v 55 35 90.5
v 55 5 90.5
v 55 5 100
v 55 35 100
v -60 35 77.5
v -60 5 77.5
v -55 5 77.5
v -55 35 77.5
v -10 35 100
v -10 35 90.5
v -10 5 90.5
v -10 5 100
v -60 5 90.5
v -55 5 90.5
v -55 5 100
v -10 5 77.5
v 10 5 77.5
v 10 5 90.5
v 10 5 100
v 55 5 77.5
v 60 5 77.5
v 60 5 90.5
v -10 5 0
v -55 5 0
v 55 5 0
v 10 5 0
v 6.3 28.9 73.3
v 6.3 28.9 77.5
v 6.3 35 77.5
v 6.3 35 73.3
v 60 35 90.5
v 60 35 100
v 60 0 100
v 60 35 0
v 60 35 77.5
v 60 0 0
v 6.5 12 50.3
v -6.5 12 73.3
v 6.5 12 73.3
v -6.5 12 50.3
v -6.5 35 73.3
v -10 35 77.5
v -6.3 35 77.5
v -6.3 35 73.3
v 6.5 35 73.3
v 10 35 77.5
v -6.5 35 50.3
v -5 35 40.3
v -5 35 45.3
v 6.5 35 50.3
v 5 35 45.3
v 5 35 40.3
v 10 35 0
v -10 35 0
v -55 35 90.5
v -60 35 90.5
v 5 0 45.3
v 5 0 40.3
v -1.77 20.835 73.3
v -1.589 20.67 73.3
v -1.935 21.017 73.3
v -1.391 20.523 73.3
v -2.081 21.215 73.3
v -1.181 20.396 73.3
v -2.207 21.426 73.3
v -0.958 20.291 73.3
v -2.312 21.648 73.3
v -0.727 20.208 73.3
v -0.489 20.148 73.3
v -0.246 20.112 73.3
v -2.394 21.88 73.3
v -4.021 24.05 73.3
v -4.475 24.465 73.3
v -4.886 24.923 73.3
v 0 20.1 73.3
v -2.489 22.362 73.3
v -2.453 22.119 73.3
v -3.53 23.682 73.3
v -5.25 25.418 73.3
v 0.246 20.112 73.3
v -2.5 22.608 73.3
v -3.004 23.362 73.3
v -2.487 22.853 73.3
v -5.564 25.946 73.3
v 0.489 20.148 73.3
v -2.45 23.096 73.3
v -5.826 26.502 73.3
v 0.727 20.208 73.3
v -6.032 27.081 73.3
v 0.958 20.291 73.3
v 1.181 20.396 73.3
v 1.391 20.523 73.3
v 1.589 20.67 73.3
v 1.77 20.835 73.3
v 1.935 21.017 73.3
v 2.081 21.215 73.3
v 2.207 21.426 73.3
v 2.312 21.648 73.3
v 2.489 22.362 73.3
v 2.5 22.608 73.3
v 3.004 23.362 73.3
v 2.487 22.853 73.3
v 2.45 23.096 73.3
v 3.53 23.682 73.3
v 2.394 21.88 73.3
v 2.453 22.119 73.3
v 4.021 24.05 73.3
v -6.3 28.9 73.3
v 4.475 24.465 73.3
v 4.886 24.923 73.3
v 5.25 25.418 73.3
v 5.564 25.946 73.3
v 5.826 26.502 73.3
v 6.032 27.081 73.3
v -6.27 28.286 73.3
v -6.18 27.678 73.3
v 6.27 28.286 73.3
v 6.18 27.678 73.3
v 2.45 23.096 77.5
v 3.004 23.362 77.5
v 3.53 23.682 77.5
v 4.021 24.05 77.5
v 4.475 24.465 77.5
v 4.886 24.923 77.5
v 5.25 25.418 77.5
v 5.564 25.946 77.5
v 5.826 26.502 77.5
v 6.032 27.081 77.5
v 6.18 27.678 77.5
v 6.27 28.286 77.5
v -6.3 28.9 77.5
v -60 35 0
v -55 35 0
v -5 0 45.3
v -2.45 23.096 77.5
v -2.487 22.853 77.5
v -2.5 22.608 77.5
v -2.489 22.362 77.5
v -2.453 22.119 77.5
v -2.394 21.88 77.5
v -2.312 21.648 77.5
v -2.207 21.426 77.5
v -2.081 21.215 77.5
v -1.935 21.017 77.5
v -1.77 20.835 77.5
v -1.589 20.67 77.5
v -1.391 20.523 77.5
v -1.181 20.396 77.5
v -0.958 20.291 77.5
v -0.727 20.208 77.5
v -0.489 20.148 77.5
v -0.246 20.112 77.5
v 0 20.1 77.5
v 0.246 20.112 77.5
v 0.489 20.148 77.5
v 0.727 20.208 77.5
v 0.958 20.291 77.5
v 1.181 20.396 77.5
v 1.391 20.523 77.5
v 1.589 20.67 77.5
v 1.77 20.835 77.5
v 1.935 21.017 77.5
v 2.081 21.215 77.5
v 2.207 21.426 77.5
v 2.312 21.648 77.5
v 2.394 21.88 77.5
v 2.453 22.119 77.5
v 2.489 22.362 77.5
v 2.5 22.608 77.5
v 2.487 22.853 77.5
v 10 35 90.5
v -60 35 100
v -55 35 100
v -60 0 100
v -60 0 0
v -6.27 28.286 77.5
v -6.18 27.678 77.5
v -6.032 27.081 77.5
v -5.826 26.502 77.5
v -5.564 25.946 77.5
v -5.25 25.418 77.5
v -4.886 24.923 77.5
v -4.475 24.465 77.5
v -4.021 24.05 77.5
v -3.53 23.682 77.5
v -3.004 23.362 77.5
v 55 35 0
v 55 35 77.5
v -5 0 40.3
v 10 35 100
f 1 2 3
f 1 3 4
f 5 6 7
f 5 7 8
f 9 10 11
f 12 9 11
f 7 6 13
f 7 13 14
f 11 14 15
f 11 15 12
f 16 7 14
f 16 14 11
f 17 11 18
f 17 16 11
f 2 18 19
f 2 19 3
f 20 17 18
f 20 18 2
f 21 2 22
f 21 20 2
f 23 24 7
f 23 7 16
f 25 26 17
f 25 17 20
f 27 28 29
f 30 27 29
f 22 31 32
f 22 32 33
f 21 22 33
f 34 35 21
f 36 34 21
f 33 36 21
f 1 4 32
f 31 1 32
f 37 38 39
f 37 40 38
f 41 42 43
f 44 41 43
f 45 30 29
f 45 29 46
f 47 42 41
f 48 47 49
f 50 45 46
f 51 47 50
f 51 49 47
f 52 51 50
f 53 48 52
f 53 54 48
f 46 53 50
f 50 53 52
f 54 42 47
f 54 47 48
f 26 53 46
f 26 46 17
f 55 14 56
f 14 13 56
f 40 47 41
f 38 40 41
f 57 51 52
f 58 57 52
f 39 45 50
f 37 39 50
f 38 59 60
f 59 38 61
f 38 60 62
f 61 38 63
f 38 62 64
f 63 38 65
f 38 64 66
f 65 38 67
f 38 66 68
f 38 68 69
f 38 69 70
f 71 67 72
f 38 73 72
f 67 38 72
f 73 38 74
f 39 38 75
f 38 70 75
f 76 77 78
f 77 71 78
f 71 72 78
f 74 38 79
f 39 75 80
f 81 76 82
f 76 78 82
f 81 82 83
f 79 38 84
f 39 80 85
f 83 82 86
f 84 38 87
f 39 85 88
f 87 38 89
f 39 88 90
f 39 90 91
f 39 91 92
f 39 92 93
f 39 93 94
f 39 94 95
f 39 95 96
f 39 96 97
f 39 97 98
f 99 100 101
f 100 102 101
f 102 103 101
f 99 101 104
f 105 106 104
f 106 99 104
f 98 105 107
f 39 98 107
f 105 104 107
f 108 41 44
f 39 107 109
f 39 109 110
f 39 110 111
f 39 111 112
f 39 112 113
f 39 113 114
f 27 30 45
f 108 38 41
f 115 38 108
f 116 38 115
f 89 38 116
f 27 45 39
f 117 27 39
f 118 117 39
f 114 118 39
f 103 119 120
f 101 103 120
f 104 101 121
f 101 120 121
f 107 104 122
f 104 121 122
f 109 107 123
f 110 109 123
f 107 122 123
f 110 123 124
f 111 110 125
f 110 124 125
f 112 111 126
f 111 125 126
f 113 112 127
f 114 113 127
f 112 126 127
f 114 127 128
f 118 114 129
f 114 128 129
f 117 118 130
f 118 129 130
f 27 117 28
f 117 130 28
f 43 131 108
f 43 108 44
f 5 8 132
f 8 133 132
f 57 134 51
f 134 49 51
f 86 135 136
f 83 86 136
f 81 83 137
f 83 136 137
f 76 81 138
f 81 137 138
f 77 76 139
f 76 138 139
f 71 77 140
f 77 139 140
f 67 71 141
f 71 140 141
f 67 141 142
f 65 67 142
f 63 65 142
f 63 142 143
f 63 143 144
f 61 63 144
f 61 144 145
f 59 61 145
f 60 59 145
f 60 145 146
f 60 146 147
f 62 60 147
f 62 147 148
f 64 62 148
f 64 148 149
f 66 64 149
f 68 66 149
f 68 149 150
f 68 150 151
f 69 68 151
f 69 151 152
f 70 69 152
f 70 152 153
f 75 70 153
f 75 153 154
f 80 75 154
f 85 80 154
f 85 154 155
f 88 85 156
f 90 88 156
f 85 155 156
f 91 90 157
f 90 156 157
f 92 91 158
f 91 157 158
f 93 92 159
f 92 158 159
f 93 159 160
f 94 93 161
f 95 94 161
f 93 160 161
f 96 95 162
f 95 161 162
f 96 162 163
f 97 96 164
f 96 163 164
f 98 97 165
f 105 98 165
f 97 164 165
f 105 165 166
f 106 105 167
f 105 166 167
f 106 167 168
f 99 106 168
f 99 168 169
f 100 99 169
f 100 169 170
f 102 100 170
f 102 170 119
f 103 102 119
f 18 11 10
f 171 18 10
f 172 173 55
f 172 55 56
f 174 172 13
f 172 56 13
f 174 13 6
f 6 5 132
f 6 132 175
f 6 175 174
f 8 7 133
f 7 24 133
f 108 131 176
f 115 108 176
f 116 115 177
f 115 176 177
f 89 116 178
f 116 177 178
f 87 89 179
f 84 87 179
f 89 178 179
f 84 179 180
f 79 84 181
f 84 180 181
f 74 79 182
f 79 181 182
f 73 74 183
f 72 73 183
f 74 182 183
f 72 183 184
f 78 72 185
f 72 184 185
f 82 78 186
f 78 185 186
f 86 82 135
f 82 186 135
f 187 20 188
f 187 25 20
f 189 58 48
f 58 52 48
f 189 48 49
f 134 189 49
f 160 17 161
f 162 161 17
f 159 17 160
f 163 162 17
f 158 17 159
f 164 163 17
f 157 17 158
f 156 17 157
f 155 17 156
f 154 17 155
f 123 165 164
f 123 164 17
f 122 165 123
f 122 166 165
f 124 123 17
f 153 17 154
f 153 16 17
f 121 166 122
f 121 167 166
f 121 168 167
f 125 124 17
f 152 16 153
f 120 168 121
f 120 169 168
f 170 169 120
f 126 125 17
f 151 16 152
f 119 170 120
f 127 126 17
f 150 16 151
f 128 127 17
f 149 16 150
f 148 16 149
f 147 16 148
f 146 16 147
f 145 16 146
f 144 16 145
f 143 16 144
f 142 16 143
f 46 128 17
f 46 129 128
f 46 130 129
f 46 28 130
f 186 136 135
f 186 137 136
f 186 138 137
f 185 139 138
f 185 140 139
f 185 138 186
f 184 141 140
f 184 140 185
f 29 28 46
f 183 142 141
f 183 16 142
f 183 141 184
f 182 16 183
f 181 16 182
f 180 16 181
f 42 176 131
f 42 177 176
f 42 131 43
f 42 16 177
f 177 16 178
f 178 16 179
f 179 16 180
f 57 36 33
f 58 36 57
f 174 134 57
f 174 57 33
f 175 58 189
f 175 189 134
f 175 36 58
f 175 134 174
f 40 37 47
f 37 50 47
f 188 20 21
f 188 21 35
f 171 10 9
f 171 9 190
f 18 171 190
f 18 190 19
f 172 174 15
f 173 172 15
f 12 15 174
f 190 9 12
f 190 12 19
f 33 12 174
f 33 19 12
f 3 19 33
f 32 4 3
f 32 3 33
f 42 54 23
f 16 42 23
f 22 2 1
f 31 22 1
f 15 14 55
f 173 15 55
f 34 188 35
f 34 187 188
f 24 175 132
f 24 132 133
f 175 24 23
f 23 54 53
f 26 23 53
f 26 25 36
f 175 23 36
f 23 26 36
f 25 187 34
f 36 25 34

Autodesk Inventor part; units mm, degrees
ref_plane "YZ Plane" through (0, 0, 0) normal (1, 0, 0) x (0, 1, 0)
ref_plane "XZ Plane" through (0, 0, 0) normal (0, 1, 0) x (-1, 0, 0)
sketch "Sketch1" plane through (0, 0, 0) normal (0, 0, 1) x (1, 0, 0)
  line L0 (0, 0) -> (0, 35) construction
  line L1 (0, 35) -> (-10, 35)
  line L2 (-10, 35) -> (-10, 5)
  line L3 (-10, 5) -> (-55, 5)
  line L4 (-55, 5) -> (-55, 35)
  line L5 (-55, 35) -> (-60, 35)
  line L6 (-60, 35) -> (-60, 0)
  line L7 (-60, 0) -> (0, 0)
  line L8 (0, 35) -> (10, 35)
  line L9 (10, 35) -> (10, 5)
  line L10 (10, 5) -> (55, 5)
  line L11 (55, 5) -> (55, 35)
  line L12 (55, 35) -> (60, 35)
  line L13 (60, 35) -> (60, 0)
  line L14 (60, 0) -> (0, 0)
  point P0 (-55, 0)
  point P1 (-10, 0)
  point P2 (55, 0)
  point P3 (10, 0)
  dimension "d0" = 35
  dimension "d1" = 10
  dimension "d2" = 30
  dimension "d3" = 45
  dimension "d4" = 5
extrude "Extrusion1" add sketch "Sketch1" along normal blind 100
sketch "Sketch3" plane through (-60, 0, 0) normal (-1, 0, 0) x (0, 0, 1)
  line L0 (0, 5) -> (100, 5) projected
  line L1 (0, 35) -> (0, 0) projected
  line L2 (0, 5) -> (80, 5)
  line L3 (82.5, 5) -> (77.5, 5)
  line L4 (77.5, 5) -> (77.5, 35)
  line L5 (0, 35) -> (100, 35) projected
  line L6 (82.5, 5) -> (82.5, 35)
  point P0 (82.5, 5)
  point P1 (77.5, 5)
  dimension "d8" = 80
  dimension "d9" = 5
extrude "Extrusion2" cut sketch "Sketch3" against normal through all contours L4 L5 L6 L0
sketch "Sketch4" plane through (-10, 35, 0) normal (0, 1, 0) x (1, 0, 0)
  line L0 (10, 0) -> (10, -50.3)
  line L1 (16.5, -50.3) -> (3.5, -50.3)
  line L2 (3.5, -50.3) -> (3.5, -73.3)
  line L3 (3.5, -73.3) -> (16.5, -73.3)
  line L4 (16.5, -73.3) -> (16.5, -50.3)
  dimension "d12" = 50.3
  dimension "d13" = 13
  dimension "d14" = 23
extrude "Extrusion3" cut sketch "Sketch4" against normal blind 23
sketch "Sketch11" plane through (-10, 35, 77.5) normal (0, 0, 1) x (1, 0, 0)
  line L0 (20, 0) -> (0, 0) projected
  line L1 (0, 0) -> (10, 0)
  line L2 (10, 0) -> (10, -6.1) construction
  circle A0 centre (10, -6.1) radius 6.3
  line L3 (10, -6.1) -> (10, -12.4) construction
  arc A1 (12.4503, -11.904) -> (10, -9.9) centre (10, -12.4) ccw construction
  arc A2 (7.5497, -11.904) -> (12.4503, -11.904) centre (10, -12.4) ccw
  arc A3 (10, -9.9) -> (7.5497, -11.904) centre (10, -12.4) ccw construction
  line L4 (16.5, 0) -> (16.5, -23) projected
  line L5 (16.3, -6.1) -> (16.3, 0)
  line L6 (3.7, -6.1) -> (3.7, 0)
  line L7 (3.7, 0) -> (16.3, 0)
  line L8 (16.5, 0) -> (3.5, 0) projected
  point P0 (10, -35)
  point P1 (3.7, 0)
  dimension "d32" = 10
  dimension "d33" = 6.1
  dimension "d34" = 12.6
  dimension "d35" = 6.3
  dimension "d36" = 5
extrude "Extrusion8" cut sketch "Sketch11" against normal blind 5 contours L5 A0 L0 | A0 L0 | A0 L6 L0 | A2 A0 picked at (7.9397, -7.6935)
sketch "Sketch12" plane through (-60, 0, 0) normal (-1, 0, 0) x (0, 0, 1)
  line L0 (82.5, 35) -> (82.5, 5) projected
  line L1 (82.5, 35) -> (100, 35) projected
  line L2 (82.5, 5) -> (90.5, 5)
  line L3 (82.5, 5) -> (100, 5) projected
  line L4 (90.5, 5) -> (90.5, 35)
  point P0 (0, 0)
  dimension "d39" = 8
extrude "Extrusion9" cut sketch "Sketch12" against normal through all
ref_plane "Work Plane1" through (-10, 5, 84) normal (0, 0, 1) x (1, 0, 0)
sketch "Sketch14" plane through (-10, 35, 0) normal (0, 1, 0) x (1, 0, 0)
  line L0 (5, -45.3) -> (15, -45.3)
  line L1 (15, -45.3) -> (15, -40.3)
  line L2 (15, -40.3) -> (5, -40.3)
  line L3 (5, -40.3) -> (5, -45.3)
  line L4 (0, 0) -> (0, -77.5) projected
  line L5 (3.5, -50.3) -> (16.5, -50.3) projected
  point P0 (10, 0)
  point P1 (5, -42.8)
  point P2 (10, -45.3)
  point P3 (10, -50.3)
  dimension "d47" = 10
  dimension "d48" = 5
  dimension "d49" = 5
  dimension "d50" = 5
extrude "Extrusion11" cut sketch "Sketch14" against normal through all
equation "\"d37\" = d36"
properties part number "Selection Body V1_3DPrint"
